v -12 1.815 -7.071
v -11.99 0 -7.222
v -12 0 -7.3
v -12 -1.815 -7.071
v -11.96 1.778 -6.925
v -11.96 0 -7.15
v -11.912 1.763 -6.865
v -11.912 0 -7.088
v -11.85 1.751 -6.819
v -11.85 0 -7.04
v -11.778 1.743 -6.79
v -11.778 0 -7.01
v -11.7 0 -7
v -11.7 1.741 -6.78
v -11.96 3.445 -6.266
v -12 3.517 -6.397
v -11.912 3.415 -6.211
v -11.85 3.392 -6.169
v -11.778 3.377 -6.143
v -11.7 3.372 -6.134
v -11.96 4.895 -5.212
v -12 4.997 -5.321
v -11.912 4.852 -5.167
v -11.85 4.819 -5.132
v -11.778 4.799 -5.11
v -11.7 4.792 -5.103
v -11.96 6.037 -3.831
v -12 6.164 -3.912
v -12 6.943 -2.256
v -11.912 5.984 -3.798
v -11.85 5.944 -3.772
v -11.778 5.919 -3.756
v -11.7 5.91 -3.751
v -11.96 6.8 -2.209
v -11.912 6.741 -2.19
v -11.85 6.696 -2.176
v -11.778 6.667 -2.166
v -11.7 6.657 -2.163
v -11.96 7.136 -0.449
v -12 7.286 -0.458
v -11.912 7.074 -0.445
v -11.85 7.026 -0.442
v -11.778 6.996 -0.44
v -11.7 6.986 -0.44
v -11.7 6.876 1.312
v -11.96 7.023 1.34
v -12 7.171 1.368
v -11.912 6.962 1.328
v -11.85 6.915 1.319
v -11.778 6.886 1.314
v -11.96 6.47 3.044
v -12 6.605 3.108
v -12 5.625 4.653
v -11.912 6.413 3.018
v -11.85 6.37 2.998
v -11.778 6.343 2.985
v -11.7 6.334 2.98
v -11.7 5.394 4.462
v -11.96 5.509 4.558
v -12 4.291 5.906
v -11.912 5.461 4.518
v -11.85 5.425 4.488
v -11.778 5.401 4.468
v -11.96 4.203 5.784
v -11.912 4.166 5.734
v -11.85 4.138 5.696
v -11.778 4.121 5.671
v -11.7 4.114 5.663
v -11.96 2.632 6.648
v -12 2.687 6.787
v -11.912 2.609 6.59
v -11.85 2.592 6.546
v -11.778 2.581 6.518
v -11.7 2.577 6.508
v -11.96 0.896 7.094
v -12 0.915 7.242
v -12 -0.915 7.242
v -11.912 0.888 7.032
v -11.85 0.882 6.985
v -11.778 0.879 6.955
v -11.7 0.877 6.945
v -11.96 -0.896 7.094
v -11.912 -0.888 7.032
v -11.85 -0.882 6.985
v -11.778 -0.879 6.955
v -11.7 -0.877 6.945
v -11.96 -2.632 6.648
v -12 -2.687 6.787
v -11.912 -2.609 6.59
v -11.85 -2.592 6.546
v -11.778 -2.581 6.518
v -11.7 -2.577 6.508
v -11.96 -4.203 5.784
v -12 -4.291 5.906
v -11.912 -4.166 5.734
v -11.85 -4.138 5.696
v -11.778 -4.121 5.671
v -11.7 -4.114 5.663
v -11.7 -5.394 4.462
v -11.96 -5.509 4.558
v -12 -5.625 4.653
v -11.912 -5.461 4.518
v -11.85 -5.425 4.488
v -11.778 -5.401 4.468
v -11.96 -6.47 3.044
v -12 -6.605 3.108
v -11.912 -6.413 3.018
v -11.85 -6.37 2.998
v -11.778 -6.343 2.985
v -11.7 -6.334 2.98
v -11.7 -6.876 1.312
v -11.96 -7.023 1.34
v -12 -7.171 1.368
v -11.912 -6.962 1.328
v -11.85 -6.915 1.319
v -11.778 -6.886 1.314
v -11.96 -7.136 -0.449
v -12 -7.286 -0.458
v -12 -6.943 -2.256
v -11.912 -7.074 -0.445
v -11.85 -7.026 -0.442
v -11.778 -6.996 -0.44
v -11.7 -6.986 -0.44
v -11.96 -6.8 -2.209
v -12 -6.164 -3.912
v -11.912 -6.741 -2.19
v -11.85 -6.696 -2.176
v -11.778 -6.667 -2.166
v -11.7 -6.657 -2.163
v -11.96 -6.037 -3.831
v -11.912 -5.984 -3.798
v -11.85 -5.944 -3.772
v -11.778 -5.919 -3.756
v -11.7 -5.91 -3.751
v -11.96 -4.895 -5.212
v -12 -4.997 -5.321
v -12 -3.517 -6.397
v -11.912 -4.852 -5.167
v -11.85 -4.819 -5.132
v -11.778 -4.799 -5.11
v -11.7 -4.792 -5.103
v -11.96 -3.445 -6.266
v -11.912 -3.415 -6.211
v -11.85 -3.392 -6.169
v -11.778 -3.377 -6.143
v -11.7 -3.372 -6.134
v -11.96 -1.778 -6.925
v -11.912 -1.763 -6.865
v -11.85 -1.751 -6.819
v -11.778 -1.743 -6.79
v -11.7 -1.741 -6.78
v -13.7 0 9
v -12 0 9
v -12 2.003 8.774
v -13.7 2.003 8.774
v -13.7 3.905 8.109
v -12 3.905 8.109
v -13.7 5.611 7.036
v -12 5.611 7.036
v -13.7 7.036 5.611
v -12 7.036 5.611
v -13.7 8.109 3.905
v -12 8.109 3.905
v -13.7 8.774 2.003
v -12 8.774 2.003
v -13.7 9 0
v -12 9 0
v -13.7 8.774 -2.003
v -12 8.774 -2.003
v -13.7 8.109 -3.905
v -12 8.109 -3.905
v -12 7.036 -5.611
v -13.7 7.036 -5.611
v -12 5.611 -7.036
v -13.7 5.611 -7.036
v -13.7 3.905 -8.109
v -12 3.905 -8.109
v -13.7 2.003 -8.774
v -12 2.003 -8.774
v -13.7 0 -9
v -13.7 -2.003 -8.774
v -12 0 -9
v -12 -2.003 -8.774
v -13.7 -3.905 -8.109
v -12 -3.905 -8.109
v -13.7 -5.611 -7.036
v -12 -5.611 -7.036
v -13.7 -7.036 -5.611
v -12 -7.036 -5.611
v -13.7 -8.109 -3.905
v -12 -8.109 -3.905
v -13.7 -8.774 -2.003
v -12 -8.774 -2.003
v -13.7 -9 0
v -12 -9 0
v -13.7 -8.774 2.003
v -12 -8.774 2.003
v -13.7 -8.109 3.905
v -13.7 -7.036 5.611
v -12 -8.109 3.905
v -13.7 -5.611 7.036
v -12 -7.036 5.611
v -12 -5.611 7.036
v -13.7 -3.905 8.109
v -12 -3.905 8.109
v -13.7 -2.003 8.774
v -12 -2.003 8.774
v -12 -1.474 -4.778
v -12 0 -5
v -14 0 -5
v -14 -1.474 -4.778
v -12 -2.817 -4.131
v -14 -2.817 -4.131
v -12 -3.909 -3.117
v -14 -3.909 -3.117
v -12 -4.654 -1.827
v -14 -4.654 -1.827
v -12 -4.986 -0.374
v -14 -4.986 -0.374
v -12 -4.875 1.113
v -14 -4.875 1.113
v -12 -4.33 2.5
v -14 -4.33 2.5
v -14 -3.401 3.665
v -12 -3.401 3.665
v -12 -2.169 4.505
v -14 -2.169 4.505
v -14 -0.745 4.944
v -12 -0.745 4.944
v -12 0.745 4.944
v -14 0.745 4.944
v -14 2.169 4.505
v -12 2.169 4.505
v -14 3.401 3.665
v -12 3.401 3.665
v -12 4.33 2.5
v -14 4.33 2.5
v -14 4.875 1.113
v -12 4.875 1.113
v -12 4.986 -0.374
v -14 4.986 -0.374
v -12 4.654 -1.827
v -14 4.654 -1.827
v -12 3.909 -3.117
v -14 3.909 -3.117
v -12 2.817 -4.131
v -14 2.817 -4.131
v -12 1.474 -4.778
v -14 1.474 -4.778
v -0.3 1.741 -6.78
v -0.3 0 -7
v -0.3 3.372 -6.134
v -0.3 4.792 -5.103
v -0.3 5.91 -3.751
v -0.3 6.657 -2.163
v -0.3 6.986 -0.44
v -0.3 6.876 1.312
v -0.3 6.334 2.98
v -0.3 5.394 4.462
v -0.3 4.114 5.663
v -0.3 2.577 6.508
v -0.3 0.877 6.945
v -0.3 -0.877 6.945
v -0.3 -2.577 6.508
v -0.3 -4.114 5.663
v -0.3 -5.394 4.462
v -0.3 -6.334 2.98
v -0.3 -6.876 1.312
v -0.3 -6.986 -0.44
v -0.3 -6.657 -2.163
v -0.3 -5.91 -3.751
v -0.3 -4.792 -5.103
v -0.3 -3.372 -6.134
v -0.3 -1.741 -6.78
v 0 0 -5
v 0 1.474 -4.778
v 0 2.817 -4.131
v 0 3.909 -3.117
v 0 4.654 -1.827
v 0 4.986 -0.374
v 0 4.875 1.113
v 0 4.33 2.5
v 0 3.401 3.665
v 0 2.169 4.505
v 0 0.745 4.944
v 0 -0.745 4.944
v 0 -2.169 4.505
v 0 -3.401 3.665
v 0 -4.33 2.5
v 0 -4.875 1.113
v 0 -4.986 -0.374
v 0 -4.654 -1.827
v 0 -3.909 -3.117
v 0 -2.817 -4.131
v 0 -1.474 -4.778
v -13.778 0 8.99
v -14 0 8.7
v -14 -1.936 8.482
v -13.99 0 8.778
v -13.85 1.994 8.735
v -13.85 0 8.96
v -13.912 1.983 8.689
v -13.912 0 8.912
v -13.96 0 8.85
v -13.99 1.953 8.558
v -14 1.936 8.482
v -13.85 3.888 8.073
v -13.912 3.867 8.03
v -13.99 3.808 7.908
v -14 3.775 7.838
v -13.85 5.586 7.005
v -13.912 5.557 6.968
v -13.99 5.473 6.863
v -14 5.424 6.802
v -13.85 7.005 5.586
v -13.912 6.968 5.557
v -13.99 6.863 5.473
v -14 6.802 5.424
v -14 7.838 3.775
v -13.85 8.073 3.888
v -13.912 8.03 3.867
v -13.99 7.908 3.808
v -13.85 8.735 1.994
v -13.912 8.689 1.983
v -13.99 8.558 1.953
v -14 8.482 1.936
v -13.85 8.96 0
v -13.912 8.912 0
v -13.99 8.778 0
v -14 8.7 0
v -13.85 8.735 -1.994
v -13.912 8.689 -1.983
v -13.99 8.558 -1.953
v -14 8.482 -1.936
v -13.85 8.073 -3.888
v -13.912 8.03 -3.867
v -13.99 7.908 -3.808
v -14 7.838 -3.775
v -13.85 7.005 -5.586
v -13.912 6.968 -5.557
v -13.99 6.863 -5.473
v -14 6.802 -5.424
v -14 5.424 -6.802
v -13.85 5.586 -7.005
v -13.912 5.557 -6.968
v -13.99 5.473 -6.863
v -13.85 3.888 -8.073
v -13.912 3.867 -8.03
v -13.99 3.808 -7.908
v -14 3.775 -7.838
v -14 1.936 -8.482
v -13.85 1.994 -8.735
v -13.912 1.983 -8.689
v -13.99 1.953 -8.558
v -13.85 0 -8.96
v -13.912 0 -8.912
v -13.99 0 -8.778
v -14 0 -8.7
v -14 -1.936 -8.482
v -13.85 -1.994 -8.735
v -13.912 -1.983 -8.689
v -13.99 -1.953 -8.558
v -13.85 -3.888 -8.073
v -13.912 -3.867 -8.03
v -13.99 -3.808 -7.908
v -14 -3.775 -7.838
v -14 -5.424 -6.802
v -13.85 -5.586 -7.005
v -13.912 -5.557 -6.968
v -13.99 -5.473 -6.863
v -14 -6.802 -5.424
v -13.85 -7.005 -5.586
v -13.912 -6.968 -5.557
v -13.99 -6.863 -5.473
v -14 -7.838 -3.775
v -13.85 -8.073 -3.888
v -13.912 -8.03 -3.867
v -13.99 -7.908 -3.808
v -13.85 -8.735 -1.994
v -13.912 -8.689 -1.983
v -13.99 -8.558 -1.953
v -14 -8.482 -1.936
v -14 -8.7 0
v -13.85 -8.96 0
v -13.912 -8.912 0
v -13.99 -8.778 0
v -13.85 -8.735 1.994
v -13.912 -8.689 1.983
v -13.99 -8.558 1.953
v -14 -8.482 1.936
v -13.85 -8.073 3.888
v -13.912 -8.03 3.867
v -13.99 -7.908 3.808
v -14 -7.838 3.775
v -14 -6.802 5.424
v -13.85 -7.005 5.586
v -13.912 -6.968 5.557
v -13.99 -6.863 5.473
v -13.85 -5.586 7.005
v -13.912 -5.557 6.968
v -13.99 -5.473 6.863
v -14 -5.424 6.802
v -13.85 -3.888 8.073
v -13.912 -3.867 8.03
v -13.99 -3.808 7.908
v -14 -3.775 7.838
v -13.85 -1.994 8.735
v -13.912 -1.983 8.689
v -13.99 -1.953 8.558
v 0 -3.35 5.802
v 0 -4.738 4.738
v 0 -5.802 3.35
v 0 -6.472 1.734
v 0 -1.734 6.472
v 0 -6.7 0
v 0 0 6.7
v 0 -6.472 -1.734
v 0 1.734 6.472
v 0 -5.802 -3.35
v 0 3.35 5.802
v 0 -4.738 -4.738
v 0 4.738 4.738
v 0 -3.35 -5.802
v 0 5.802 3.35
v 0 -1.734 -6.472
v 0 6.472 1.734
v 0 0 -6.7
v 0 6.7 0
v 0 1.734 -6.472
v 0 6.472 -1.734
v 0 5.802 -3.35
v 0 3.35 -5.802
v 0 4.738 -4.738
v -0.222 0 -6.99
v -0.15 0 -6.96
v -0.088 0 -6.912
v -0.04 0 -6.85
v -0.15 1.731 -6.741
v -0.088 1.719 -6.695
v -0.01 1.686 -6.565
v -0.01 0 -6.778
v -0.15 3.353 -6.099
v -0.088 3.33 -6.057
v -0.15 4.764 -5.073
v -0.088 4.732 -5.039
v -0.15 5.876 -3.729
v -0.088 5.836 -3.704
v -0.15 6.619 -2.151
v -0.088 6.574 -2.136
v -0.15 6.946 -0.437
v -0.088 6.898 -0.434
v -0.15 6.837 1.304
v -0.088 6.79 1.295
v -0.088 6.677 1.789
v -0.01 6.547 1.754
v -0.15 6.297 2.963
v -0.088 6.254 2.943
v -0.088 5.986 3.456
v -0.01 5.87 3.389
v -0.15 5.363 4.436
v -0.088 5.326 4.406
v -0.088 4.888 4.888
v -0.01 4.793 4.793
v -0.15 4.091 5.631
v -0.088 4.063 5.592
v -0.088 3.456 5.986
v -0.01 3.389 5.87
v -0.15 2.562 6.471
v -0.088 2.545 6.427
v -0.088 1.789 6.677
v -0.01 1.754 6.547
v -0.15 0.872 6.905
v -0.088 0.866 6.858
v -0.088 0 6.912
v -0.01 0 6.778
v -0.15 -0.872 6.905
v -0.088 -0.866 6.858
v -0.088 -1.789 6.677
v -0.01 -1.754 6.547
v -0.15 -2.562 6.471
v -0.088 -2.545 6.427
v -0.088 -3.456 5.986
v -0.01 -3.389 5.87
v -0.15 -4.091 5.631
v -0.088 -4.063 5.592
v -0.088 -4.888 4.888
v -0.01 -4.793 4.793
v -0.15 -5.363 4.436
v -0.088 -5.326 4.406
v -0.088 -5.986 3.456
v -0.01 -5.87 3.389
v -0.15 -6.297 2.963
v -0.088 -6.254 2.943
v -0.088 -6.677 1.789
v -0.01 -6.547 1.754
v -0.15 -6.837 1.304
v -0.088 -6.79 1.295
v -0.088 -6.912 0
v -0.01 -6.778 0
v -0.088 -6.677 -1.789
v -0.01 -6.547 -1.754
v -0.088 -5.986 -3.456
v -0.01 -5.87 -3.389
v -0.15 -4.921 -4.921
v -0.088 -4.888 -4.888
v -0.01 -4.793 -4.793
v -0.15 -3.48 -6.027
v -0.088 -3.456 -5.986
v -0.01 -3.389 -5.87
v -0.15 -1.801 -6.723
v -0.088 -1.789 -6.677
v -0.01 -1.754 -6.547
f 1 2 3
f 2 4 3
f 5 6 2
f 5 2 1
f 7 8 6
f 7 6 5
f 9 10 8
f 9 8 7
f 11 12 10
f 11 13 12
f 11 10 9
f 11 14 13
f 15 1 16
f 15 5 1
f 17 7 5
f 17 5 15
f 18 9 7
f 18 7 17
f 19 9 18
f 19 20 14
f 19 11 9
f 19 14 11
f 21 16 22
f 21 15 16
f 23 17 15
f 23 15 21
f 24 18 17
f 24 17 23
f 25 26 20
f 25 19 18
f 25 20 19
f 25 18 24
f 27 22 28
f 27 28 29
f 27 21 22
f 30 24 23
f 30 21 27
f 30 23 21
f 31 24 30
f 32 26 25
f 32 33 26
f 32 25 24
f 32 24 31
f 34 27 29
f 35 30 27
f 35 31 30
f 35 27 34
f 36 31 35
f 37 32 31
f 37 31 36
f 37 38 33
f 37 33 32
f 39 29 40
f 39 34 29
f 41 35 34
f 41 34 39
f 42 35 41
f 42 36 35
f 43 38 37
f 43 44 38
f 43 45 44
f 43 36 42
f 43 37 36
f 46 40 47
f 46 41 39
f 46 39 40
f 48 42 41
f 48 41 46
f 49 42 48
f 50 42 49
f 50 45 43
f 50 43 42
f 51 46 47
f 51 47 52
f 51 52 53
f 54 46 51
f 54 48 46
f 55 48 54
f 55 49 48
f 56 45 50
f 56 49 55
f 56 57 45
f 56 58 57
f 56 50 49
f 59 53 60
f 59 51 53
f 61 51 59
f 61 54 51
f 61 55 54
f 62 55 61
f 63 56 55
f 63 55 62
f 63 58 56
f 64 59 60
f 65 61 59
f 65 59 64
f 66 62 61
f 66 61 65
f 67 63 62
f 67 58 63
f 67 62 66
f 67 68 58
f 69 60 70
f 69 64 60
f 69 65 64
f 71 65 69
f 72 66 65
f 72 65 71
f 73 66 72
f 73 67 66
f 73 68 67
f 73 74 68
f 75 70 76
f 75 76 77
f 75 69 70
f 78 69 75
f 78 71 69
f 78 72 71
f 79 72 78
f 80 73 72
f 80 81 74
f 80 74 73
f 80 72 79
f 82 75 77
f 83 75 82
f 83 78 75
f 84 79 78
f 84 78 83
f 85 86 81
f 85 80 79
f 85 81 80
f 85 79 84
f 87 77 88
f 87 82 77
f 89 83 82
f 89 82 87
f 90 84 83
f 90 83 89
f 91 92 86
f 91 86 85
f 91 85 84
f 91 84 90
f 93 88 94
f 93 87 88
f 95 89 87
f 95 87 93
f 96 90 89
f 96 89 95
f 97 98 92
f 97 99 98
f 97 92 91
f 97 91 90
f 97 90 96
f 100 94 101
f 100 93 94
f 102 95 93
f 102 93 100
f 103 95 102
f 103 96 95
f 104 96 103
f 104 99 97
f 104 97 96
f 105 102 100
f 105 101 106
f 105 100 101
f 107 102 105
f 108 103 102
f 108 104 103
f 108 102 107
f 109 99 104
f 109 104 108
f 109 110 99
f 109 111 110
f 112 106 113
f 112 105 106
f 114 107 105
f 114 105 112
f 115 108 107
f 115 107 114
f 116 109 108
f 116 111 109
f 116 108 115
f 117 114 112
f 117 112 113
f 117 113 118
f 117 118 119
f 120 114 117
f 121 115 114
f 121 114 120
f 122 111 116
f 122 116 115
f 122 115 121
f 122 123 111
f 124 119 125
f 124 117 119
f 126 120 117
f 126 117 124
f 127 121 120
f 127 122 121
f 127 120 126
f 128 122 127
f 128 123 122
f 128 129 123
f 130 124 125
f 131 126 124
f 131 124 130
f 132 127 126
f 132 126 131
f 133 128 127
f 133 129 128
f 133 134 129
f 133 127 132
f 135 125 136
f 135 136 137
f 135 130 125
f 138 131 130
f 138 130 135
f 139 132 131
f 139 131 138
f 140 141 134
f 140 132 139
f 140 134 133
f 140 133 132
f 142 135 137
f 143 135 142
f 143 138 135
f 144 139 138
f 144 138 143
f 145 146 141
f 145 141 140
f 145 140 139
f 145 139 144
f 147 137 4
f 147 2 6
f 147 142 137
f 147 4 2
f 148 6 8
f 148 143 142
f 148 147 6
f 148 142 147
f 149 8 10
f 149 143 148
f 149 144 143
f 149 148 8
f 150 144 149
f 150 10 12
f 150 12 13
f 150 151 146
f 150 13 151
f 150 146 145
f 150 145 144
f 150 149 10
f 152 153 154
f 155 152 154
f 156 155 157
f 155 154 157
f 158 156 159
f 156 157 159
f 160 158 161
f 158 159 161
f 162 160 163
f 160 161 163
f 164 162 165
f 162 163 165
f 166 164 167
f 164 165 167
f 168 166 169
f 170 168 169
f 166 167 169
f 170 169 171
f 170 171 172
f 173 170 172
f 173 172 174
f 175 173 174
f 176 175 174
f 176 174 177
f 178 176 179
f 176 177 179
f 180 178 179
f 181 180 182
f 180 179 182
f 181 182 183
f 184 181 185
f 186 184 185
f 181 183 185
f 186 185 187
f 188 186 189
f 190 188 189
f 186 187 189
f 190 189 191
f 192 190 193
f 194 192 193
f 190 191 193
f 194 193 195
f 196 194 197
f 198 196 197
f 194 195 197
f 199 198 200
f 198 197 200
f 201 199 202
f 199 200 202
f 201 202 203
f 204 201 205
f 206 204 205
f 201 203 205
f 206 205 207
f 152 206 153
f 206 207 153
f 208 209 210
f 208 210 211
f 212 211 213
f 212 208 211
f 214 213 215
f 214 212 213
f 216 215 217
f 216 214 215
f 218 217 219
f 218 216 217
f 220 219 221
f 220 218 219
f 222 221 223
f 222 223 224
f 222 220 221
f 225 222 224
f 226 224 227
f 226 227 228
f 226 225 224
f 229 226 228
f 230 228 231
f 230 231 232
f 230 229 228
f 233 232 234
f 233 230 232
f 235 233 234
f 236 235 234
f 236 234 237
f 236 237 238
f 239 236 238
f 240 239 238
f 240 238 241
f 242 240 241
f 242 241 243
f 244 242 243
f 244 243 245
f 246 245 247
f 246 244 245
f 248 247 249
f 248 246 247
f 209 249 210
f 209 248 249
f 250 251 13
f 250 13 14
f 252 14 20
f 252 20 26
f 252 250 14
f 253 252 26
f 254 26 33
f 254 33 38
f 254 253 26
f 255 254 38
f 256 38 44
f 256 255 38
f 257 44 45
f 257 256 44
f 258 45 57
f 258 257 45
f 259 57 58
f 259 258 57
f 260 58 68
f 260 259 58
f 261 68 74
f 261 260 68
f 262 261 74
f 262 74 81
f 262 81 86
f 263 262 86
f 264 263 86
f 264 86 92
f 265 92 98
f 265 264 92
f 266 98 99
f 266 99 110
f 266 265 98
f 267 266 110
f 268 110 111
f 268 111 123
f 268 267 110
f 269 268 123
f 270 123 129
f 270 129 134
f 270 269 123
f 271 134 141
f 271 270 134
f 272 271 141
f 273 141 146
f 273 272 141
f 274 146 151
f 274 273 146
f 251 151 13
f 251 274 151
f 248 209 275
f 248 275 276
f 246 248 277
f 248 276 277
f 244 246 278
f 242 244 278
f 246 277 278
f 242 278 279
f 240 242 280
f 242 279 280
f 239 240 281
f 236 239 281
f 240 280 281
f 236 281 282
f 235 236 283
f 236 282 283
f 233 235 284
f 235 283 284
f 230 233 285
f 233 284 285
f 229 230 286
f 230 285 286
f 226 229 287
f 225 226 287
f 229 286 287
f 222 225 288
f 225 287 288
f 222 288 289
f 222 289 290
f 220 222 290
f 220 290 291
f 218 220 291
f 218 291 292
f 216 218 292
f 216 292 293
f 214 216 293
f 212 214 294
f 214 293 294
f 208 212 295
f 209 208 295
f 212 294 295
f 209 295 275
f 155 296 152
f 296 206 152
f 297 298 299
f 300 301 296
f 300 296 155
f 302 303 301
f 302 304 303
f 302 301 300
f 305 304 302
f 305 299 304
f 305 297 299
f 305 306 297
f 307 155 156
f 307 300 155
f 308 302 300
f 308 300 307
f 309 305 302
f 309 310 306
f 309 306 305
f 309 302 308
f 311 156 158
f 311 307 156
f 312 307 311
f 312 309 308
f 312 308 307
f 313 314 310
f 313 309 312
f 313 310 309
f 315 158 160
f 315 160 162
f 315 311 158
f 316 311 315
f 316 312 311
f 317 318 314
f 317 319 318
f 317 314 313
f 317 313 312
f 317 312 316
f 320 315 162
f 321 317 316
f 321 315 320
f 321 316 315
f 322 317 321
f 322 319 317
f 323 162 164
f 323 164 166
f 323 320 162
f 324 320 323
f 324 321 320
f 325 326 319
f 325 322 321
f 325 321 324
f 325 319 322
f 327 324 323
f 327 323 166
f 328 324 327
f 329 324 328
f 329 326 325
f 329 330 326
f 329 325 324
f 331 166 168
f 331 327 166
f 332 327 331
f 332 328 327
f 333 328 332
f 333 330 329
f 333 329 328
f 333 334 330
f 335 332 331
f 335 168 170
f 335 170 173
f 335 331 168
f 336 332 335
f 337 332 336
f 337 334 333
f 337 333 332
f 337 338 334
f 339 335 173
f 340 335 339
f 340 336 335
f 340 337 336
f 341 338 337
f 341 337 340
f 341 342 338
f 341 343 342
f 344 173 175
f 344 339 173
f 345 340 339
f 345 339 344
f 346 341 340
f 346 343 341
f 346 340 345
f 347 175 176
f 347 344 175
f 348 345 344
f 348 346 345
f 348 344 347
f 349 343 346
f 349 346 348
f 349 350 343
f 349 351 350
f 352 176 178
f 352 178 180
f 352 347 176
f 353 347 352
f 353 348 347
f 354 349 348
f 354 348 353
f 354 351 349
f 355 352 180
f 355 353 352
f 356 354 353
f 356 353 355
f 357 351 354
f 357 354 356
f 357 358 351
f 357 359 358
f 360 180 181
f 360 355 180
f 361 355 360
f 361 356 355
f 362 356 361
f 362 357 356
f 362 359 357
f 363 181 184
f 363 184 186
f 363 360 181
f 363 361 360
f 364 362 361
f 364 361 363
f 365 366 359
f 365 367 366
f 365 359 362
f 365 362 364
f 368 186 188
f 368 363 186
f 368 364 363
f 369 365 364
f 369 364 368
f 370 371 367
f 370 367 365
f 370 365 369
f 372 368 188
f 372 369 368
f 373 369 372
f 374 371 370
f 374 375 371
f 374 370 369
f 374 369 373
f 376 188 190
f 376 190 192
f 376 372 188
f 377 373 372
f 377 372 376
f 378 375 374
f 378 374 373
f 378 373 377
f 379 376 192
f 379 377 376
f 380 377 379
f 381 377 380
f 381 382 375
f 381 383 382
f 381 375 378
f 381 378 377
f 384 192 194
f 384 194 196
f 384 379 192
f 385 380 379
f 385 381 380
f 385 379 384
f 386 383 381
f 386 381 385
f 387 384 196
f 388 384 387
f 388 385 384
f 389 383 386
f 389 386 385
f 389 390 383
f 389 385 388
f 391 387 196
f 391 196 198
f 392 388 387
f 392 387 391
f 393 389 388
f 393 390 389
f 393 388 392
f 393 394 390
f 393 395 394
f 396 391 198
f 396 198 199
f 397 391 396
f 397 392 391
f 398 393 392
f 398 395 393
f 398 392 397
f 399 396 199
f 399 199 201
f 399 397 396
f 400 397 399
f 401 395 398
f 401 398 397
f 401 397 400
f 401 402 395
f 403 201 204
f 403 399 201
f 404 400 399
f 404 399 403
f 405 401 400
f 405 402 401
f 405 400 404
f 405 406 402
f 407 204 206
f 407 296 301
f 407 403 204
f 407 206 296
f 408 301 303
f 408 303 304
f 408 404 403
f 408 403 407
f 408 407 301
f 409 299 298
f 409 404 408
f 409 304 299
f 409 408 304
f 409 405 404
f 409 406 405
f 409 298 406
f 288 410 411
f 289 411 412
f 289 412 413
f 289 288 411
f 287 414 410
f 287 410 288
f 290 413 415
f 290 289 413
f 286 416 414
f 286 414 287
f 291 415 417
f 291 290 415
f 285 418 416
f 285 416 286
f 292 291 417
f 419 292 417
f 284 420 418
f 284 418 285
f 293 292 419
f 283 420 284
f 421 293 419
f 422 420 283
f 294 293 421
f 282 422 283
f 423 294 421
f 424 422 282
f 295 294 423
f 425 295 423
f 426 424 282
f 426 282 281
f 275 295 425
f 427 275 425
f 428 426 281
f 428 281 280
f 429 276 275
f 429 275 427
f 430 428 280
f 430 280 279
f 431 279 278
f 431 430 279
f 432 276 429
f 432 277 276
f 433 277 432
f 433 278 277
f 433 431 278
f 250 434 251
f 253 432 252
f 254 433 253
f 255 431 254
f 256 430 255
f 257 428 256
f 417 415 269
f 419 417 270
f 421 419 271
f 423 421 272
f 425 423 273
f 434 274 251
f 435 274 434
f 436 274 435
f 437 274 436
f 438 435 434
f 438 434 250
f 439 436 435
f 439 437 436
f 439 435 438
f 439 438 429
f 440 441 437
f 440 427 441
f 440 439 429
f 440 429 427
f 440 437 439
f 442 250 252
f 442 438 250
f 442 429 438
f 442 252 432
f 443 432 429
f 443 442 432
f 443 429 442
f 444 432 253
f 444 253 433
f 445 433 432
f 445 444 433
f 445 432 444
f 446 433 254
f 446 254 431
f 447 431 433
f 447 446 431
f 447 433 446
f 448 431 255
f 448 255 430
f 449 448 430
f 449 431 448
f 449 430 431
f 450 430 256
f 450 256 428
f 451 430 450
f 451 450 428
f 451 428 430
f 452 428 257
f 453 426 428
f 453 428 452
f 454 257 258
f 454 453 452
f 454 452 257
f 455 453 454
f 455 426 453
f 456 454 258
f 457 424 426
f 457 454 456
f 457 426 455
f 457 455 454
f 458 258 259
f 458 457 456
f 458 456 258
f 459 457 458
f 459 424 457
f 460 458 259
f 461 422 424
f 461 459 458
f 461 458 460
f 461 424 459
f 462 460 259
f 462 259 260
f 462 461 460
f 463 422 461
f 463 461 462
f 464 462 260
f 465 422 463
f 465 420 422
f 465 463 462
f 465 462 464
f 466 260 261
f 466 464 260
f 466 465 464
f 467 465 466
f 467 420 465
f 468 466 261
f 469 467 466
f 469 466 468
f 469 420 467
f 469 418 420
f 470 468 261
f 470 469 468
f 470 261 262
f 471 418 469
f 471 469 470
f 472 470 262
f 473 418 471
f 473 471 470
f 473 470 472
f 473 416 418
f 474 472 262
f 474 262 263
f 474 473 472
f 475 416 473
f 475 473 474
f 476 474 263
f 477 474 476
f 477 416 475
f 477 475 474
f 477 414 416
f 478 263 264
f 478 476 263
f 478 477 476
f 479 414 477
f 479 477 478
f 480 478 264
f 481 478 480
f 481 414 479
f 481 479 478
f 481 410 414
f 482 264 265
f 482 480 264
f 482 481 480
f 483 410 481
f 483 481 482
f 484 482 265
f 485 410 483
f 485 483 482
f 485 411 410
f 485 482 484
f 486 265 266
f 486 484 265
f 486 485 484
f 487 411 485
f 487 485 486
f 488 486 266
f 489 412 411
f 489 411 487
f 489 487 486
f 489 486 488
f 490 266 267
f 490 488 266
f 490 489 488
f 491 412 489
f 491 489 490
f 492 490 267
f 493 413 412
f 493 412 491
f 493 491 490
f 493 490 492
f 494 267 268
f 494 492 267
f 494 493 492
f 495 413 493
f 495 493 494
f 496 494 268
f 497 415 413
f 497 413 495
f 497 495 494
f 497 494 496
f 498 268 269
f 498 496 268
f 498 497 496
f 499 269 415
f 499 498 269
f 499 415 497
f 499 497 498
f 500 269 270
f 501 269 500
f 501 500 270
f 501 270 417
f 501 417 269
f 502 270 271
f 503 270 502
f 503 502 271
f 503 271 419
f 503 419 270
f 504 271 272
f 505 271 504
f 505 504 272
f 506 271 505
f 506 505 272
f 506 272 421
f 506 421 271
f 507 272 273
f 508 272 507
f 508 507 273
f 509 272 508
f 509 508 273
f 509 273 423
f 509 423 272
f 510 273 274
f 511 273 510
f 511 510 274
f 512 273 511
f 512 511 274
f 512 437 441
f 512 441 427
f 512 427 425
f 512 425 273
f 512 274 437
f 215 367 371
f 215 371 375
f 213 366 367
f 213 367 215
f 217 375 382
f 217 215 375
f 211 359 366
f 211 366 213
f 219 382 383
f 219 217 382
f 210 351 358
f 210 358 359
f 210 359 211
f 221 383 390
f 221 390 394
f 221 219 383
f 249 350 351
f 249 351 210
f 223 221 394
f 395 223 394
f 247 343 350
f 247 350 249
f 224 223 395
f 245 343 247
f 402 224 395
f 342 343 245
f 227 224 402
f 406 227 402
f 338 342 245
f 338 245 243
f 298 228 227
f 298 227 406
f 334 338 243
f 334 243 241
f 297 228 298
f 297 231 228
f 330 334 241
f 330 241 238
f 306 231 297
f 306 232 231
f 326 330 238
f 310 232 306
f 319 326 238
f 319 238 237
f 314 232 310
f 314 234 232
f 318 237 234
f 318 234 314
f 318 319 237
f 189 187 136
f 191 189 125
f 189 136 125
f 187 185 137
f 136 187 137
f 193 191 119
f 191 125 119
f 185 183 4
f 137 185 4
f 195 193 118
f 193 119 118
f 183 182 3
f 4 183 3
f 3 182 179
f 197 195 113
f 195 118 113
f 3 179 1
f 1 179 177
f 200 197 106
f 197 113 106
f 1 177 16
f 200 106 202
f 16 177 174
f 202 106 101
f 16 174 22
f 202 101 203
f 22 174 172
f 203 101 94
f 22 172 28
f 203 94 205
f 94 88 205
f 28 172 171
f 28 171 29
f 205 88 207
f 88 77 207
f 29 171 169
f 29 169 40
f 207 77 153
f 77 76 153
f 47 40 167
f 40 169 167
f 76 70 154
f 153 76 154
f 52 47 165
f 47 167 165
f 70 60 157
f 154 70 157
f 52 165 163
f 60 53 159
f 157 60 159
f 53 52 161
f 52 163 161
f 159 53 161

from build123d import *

# Parameters (mm, degrees)
SKETCH1_R           = 7
SKETCH1_R_2         = 5
BOSS_EXTRUDE1_DEPTH = 12
SKETCH2_R           = 9
SKETCH2_R_2         = 5
BOSS_EXTRUDE2_DEPTH = 2
FILLET1_R           = 0.3


with BuildPart() as part:
    # Sketch1 → Boss-Extrude1 (new body)
    with BuildSketch(Plane(origin=(0, 0, 0), x_dir=(0, 0, -1), z_dir=(1, 0, 0))):
        Circle(SKETCH1_R)
        Circle(SKETCH1_R_2, mode=Mode.SUBTRACT)
    extrude(amount=-BOSS_EXTRUDE1_DEPTH)

    # Sketch2 → Boss-Extrude2 (add)
    with BuildSketch(Plane.ZY.offset(12)):
        Circle(SKETCH2_R)
        with Locations(Location((0, 0, 0), (0, 0, 180))):
            Circle(SKETCH2_R_2, mode=Mode.SUBTRACT)
    extrude(amount=BOSS_EXTRUDE2_DEPTH)

    # Fillet1
    fillet1_edges = [part.edges().sort_by_distance(p)[0] for p in [
        (-12, 0, 7),
        (-14, 0, -9),
        (0, 0, 7),
    ]]
    fillet(fillet1_edges, radius=FILLET1_R)


solid = part.part
